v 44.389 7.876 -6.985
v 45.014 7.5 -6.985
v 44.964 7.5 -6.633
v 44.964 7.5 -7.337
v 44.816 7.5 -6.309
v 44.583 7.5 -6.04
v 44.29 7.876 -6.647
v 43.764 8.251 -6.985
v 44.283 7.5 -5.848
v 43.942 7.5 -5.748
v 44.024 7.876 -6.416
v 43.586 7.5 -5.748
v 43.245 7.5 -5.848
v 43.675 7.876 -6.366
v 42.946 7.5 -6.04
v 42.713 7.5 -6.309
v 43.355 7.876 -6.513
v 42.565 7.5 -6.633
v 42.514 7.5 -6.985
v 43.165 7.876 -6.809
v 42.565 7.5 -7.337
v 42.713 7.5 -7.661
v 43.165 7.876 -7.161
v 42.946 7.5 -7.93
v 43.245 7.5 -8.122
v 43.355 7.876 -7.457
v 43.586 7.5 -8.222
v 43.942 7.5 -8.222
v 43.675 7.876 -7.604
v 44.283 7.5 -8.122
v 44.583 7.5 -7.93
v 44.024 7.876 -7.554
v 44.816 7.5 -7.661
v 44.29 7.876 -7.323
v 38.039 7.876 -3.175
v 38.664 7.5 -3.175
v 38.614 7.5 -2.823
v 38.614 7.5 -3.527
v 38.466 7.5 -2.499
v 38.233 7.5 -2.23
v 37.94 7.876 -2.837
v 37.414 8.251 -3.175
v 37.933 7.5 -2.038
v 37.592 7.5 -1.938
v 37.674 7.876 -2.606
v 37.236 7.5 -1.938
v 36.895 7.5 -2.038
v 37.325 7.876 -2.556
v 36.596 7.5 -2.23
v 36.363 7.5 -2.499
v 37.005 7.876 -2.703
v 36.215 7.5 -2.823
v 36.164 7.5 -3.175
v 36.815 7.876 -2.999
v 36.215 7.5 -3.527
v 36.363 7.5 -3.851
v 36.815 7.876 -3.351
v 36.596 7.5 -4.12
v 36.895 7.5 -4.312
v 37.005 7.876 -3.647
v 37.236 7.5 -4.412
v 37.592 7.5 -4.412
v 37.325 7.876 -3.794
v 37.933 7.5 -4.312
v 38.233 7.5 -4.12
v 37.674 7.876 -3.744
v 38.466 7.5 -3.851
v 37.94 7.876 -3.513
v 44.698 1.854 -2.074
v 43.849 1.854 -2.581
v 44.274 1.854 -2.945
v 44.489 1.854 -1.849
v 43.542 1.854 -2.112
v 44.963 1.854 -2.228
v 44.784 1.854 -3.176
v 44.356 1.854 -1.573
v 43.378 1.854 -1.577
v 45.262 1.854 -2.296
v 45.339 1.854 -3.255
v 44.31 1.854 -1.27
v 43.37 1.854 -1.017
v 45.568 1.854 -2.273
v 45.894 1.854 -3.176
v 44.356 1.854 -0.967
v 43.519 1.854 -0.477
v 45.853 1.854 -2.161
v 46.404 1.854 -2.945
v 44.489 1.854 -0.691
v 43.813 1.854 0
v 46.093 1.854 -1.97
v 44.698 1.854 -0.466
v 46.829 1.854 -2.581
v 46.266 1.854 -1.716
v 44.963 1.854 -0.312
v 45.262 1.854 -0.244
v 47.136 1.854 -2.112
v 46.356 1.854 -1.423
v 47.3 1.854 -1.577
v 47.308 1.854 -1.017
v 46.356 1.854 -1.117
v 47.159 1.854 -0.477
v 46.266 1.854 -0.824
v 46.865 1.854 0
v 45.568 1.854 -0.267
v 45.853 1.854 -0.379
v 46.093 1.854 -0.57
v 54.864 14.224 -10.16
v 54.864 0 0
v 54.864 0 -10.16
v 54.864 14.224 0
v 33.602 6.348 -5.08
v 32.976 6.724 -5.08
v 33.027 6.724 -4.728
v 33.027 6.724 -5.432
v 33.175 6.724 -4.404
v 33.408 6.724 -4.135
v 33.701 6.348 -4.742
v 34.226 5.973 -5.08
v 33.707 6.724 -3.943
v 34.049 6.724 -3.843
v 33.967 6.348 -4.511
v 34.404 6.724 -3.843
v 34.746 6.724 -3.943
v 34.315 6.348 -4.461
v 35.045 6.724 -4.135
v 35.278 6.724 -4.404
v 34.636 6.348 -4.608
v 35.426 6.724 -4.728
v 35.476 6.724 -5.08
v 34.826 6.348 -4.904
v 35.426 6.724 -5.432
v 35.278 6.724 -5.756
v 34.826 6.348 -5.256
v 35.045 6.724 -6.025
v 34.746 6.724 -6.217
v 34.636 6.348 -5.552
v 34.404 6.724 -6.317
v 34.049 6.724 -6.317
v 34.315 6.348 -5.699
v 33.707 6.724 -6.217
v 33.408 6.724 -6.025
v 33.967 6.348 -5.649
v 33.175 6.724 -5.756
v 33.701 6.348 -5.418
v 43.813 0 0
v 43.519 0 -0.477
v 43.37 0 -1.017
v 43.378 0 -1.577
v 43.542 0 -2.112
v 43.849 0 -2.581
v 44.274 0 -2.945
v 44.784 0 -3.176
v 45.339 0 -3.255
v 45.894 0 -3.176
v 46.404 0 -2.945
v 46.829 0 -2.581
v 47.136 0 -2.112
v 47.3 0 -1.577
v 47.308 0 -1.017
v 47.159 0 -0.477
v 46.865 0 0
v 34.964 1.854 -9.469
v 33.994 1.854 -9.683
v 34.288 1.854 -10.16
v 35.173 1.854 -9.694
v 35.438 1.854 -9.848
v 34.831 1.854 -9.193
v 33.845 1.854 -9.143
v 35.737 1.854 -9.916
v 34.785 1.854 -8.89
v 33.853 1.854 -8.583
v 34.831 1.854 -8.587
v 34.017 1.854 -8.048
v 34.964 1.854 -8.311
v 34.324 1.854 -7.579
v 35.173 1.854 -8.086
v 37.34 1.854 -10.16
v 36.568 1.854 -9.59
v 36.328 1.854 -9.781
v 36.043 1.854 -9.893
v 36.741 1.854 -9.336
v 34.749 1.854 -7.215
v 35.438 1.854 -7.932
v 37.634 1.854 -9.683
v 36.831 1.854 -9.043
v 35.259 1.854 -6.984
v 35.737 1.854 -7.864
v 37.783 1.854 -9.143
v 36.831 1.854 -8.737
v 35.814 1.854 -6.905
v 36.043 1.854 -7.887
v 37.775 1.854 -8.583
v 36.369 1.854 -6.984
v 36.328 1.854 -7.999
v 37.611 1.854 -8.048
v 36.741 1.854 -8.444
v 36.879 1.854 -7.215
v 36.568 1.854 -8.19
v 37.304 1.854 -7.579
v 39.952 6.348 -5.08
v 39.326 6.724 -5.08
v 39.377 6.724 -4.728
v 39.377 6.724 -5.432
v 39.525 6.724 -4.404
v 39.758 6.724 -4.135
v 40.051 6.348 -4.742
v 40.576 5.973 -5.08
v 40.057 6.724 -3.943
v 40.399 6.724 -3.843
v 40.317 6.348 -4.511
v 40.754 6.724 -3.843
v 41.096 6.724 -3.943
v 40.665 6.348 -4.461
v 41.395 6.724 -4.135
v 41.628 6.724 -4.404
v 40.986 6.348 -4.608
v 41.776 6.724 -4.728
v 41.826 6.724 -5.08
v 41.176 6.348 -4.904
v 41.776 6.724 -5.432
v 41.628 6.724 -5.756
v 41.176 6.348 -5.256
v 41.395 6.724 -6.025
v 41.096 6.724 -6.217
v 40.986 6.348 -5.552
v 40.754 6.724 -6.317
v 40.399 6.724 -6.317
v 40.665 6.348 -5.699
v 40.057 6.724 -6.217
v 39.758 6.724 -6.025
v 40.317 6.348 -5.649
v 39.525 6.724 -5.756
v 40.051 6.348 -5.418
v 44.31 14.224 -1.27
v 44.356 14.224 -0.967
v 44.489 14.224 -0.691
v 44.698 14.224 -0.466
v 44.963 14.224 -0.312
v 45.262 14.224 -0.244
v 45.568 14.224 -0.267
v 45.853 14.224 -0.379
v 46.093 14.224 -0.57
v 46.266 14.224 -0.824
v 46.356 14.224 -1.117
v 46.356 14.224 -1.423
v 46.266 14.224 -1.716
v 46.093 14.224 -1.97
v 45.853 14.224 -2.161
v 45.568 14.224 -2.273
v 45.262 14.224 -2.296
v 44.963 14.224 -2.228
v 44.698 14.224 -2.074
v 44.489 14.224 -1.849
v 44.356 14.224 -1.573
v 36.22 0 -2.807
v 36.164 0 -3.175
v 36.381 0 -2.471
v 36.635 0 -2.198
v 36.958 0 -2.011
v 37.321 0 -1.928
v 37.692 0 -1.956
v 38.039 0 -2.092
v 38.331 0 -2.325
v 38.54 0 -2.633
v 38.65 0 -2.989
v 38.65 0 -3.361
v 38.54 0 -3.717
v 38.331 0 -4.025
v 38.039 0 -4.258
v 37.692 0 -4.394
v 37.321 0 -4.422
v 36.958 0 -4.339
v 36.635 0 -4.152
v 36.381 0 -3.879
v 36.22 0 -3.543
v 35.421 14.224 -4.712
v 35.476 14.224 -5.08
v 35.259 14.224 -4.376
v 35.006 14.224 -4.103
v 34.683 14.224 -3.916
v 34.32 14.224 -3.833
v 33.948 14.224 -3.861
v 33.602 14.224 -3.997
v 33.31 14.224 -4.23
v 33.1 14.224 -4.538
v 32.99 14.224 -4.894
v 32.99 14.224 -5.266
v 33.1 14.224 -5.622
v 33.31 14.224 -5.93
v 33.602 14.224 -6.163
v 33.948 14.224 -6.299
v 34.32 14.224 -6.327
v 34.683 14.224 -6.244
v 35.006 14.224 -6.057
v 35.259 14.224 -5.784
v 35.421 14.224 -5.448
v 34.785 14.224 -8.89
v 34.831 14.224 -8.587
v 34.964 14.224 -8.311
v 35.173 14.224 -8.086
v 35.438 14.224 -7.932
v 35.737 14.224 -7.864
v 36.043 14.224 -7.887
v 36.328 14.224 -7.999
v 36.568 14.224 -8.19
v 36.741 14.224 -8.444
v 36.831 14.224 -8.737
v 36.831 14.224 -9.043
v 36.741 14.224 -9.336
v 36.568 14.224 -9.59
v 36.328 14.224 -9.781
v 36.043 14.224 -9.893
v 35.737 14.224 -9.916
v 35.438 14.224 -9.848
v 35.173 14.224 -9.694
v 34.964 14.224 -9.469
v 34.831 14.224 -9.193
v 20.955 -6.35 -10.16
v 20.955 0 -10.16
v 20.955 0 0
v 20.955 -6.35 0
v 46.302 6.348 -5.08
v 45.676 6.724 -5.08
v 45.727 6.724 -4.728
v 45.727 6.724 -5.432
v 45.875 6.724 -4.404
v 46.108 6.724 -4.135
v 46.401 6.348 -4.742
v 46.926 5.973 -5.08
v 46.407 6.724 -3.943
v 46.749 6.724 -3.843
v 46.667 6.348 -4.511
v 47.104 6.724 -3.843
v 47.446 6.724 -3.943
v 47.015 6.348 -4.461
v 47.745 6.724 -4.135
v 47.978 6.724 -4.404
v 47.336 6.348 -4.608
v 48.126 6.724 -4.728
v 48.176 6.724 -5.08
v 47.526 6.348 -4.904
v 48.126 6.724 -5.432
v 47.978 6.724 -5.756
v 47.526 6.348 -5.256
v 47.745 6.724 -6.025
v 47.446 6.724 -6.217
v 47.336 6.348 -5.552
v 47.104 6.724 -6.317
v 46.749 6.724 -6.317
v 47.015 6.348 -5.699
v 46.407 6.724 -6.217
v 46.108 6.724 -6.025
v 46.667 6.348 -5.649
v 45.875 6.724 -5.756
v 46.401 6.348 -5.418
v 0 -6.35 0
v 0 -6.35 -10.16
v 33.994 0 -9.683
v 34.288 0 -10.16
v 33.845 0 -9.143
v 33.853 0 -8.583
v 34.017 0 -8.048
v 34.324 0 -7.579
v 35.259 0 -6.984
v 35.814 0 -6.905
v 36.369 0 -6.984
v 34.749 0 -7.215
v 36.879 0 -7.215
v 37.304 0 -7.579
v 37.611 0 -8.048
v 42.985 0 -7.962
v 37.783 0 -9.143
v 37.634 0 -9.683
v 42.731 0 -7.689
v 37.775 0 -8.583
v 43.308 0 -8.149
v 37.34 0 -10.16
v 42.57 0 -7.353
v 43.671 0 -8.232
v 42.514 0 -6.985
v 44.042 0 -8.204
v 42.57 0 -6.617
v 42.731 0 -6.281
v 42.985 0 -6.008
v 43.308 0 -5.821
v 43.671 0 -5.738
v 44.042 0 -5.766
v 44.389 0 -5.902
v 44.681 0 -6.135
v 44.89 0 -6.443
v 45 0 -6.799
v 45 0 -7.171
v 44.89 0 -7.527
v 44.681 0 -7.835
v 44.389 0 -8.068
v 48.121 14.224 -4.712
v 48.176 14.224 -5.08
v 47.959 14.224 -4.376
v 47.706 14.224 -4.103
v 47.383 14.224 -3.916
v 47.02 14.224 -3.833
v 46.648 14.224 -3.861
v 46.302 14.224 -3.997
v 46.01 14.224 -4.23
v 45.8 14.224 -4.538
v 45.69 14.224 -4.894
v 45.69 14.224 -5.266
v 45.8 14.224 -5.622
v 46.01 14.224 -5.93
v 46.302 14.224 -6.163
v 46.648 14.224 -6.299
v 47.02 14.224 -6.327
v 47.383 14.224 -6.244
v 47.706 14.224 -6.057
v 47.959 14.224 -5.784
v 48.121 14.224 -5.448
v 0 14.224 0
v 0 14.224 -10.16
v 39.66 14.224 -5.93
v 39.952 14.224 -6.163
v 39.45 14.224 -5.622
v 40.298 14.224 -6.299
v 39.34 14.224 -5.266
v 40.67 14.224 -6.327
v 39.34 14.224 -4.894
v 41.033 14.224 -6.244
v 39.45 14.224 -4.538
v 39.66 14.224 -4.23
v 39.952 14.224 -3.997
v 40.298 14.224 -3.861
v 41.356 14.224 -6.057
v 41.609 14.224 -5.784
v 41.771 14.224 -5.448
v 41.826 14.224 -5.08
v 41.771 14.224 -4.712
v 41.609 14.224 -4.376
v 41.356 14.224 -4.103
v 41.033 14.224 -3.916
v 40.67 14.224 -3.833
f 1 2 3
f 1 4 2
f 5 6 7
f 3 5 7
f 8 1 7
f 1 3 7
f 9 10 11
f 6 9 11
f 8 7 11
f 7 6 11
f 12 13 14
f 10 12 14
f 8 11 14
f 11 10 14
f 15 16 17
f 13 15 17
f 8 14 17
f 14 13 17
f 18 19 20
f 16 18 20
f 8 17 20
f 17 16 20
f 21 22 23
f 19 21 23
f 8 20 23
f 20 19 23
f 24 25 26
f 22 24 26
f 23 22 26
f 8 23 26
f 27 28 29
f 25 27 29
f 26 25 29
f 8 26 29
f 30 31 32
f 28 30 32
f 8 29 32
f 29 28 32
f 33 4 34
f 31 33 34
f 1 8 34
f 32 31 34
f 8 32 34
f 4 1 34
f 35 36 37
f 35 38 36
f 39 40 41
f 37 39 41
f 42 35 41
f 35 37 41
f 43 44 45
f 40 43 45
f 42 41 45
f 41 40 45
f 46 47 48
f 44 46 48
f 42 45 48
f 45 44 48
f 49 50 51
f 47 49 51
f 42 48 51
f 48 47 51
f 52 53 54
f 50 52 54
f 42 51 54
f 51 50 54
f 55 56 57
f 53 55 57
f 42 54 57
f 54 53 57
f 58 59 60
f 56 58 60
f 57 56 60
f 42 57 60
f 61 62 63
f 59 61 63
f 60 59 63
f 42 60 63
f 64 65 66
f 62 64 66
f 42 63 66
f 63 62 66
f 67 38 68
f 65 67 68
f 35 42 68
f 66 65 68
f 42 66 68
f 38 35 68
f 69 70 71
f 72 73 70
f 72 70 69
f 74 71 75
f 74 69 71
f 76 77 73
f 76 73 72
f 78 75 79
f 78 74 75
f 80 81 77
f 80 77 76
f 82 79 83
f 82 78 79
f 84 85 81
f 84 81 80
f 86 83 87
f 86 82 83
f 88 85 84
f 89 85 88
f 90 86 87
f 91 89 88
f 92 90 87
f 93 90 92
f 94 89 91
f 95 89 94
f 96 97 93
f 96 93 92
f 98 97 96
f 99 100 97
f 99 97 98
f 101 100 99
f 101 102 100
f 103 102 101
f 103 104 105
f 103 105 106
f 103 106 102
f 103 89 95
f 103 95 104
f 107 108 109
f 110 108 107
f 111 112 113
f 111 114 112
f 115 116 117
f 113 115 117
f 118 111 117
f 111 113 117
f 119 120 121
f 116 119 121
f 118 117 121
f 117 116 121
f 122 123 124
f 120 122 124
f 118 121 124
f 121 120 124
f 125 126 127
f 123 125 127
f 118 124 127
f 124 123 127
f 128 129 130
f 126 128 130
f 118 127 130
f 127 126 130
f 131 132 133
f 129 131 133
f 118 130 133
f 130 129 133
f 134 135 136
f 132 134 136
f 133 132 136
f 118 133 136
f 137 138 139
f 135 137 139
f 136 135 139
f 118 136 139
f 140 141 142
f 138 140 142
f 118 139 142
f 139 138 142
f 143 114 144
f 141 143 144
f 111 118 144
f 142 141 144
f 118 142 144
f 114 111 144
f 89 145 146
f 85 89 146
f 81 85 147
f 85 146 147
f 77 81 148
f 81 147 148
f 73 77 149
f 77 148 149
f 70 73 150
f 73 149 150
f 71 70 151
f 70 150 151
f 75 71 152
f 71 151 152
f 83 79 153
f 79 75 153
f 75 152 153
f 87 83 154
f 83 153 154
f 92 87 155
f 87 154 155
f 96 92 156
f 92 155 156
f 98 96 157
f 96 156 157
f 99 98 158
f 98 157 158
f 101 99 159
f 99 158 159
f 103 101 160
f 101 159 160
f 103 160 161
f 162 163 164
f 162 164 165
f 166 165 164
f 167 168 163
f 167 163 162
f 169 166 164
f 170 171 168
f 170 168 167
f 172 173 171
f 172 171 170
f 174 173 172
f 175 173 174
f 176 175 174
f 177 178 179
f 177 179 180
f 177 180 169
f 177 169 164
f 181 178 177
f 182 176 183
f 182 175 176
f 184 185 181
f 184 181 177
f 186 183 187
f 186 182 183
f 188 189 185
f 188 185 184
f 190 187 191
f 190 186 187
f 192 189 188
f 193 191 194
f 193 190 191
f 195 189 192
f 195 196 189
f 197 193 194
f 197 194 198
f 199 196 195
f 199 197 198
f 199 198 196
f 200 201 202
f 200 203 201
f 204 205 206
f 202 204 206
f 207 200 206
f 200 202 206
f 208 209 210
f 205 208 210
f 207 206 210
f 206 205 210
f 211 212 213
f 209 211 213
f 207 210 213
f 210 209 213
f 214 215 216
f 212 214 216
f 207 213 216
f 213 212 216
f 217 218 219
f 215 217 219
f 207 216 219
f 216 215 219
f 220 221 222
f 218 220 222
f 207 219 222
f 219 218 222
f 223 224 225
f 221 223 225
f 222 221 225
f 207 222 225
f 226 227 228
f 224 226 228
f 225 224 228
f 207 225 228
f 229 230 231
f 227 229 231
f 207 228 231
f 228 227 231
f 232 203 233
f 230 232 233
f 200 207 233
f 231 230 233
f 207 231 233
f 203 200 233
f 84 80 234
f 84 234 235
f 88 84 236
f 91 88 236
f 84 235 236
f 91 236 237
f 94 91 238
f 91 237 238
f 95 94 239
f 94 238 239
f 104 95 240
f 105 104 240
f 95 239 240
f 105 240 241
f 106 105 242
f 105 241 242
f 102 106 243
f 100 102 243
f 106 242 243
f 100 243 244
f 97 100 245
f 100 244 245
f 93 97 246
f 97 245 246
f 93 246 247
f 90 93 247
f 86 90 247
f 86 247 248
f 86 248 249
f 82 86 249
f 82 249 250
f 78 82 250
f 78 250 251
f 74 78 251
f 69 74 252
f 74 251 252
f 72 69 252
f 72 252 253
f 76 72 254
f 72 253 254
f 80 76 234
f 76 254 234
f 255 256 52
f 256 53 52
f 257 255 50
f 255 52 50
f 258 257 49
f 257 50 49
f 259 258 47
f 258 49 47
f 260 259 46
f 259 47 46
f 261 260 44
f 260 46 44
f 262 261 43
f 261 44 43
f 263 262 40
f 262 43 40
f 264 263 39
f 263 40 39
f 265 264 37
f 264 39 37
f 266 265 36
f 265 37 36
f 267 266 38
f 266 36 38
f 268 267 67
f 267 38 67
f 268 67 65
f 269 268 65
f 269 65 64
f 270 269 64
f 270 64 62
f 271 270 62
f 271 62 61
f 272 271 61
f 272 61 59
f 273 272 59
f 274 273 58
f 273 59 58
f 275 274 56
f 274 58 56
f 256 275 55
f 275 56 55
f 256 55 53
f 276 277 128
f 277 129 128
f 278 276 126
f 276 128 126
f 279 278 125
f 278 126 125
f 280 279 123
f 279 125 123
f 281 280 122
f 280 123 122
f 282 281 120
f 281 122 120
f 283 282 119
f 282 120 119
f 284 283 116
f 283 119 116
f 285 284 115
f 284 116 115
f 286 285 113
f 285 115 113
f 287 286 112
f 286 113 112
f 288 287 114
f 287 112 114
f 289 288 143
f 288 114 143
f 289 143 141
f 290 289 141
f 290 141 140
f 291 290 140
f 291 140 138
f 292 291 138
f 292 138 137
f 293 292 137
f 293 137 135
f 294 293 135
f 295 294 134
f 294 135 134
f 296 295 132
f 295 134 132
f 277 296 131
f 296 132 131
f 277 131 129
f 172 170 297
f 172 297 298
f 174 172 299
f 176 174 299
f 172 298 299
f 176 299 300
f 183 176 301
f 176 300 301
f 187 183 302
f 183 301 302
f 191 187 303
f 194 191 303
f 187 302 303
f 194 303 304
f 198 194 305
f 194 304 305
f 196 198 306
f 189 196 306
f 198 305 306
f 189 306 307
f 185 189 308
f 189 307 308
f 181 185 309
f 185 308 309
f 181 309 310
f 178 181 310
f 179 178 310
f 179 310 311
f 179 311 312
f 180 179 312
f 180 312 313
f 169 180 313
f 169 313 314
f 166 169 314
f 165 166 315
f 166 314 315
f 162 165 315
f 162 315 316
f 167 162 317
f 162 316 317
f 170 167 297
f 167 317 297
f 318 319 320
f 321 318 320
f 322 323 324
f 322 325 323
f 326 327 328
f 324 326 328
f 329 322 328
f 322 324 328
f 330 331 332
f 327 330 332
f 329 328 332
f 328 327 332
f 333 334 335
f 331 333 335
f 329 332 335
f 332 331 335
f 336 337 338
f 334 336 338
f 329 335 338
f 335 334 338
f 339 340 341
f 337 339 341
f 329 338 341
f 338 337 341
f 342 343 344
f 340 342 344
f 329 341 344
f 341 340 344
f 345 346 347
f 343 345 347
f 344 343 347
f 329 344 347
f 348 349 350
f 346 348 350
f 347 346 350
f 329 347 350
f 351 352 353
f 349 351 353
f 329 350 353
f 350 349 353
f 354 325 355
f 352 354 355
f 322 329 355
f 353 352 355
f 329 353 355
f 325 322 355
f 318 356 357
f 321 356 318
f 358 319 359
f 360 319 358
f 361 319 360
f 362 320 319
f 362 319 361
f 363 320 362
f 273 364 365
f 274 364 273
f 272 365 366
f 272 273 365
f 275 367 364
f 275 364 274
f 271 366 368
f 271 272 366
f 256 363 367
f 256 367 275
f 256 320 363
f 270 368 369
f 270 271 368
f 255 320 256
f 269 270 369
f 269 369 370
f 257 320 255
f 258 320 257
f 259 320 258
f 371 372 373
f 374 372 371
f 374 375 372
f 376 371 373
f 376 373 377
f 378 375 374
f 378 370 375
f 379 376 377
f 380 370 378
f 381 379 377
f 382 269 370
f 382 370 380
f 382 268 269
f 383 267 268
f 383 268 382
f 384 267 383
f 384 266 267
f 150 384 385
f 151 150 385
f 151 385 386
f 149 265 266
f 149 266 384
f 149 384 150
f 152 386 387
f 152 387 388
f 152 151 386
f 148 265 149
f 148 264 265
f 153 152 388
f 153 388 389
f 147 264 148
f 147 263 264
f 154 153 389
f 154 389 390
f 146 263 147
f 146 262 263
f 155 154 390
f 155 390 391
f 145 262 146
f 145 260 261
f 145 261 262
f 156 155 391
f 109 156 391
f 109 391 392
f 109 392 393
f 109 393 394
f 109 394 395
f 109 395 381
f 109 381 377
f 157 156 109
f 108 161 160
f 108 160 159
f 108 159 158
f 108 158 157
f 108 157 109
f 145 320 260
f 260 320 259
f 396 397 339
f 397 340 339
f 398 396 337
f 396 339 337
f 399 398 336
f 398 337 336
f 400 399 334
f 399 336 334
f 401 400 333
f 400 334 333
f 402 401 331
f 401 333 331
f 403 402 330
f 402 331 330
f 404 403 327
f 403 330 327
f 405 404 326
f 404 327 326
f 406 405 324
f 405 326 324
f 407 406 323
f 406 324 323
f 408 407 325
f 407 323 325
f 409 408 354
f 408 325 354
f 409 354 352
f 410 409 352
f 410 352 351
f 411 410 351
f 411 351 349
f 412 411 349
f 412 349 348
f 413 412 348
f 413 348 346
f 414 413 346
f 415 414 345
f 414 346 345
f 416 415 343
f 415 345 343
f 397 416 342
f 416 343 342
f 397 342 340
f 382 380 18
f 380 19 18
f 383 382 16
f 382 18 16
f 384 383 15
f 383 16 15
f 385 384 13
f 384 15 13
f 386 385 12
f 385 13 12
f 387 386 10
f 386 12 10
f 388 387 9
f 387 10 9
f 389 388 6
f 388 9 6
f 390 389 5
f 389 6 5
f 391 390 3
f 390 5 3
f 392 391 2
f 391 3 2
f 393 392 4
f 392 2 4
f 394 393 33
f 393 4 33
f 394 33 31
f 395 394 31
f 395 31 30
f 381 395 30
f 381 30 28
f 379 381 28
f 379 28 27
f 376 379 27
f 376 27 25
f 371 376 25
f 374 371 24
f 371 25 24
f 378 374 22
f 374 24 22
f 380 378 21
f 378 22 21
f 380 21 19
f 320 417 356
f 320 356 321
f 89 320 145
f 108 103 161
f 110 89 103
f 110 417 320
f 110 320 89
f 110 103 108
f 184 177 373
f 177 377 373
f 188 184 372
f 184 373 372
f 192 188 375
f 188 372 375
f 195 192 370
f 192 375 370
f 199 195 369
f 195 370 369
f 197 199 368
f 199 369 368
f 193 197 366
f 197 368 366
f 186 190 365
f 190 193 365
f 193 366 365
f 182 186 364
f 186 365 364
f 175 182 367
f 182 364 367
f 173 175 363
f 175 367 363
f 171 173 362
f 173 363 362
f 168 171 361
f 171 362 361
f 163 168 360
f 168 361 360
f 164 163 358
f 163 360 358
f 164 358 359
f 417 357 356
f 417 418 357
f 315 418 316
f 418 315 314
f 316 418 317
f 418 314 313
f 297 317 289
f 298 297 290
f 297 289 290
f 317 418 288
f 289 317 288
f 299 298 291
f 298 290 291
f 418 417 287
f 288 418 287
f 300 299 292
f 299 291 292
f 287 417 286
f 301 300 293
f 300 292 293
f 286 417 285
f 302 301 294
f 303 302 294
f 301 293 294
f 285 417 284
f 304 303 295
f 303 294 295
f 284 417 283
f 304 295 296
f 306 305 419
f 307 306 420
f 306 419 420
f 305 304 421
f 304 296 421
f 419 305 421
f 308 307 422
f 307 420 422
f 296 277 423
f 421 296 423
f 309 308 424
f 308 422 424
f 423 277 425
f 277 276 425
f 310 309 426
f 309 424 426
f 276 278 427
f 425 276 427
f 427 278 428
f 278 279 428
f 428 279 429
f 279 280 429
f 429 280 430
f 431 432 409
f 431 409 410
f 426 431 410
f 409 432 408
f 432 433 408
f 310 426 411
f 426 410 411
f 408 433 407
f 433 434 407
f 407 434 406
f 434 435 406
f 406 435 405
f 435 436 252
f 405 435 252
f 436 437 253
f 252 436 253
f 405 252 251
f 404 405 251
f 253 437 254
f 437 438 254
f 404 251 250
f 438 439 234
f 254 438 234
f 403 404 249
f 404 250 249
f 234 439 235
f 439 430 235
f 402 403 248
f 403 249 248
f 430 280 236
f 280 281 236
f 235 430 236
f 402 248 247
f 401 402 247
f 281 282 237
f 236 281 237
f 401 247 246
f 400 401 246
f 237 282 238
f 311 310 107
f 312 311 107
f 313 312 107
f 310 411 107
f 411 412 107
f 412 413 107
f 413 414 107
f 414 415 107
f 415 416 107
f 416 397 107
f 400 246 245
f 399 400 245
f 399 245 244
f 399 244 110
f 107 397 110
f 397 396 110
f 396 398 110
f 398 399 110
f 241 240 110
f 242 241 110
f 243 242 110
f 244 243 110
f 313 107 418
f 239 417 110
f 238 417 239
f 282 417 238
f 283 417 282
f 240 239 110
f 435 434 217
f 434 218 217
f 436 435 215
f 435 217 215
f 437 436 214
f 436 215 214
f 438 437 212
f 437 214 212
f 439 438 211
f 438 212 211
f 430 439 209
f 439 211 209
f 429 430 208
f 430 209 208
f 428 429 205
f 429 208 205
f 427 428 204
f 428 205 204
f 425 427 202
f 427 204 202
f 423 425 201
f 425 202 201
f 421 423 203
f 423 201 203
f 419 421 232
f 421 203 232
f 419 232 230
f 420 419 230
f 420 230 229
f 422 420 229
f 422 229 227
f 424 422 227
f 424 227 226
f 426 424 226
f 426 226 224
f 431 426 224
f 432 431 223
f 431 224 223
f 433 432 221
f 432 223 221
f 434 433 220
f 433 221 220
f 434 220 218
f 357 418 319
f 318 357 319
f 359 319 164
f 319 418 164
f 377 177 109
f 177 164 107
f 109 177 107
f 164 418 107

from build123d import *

# Parameters (mm, degrees)
SKETCH1_W                                      = 54.864
SKETCH1_H                                      = 14.224
BASE_EXTRUDE_DEPTH                             = 10.16
SKETCH2_W                                      = 20.955
SKETCH2_H                                      = 10.16
BOSS_EXTRUDE1_DEPTH                            = 6.35
M3X0_5_TAPPED_HOLE1_D                          = 2.5
M3X0_5_TAPPED_HOLE1_DEPTH                      = 7.499985
M3X0_5_TAPPED_HOLE1_TIP                        = 0.751075774
CBORE_FOR_1_SOCKET_HEAD_CAP_SCREW1_D           = 2.0574
CBORE_FOR_1_SOCKET_HEAD_CAP_SCREW1_DEPTH       = 22.86
CBORE_FOR_1_SOCKET_HEAD_CAP_SCREW1_CBORE_D     = 3.97002
CBORE_FOR_1_SOCKET_HEAD_CAP_SCREW1_CBORE_DEPTH = 1.8542
CBORE_FOR_1_SOCKET_HEAD_CAP_SCREW1_TIP         = 0.618105319
M3X0_5_TAPPED_HOLE2_D                          = 2.5
M3X0_5_TAPPED_HOLE2_DEPTH                      = 7.5000104
M3X0_5_TAPPED_HOLE2_TIP                        = 0.751075774


with BuildPart() as part:
    # Sketch1 → Base-Extrude (new body)
    with BuildSketch(Plane.XY):
        with Locations((27.432, 7.112)):
            Rectangle(SKETCH1_W, SKETCH1_H)
    extrude(amount=-BASE_EXTRUDE_DEPTH)

    # Sketch2 → Boss-Extrude1 (add)
    with BuildSketch(Plane.XZ):
        with Locations((10.4775, -5.08)):
            Rectangle(SKETCH2_W, SKETCH2_H)
    extrude(amount=BOSS_EXTRUDE1_DEPTH)

    # M3x0.5 Tapped Hole1
    with Locations(Plane(origin=(0, 14.224, 0), x_dir=(-1, 0, 0), z_dir=(0, 1, 0))):
        with Locations((-46.9265, -5.08), (-40.5765, -5.08), (-34.2265, -5.08)):
            Hole(M3X0_5_TAPPED_HOLE1_D / 2, depth=M3X0_5_TAPPED_HOLE1_DEPTH)
            with Locations((0, 0, -(M3X0_5_TAPPED_HOLE1_DEPTH + M3X0_5_TAPPED_HOLE1_TIP / 2))):  # 118° drill point
                Cone(0, M3X0_5_TAPPED_HOLE1_D / 2, M3X0_5_TAPPED_HOLE1_TIP, mode=Mode.SUBTRACT)

    # CBORE for #1 Socket Head Cap Screw1
    with Locations(Plane.XZ):
        with Locations((45.339, -1.27), (35.814, -8.89)):
            CounterBoreHole(CBORE_FOR_1_SOCKET_HEAD_CAP_SCREW1_D / 2, CBORE_FOR_1_SOCKET_HEAD_CAP_SCREW1_CBORE_D / 2, CBORE_FOR_1_SOCKET_HEAD_CAP_SCREW1_CBORE_DEPTH, depth=CBORE_FOR_1_SOCKET_HEAD_CAP_SCREW1_DEPTH)
            with Locations((0, 0, -(CBORE_FOR_1_SOCKET_HEAD_CAP_SCREW1_DEPTH + CBORE_FOR_1_SOCKET_HEAD_CAP_SCREW1_TIP / 2))):  # 118° drill point
                Cone(0, CBORE_FOR_1_SOCKET_HEAD_CAP_SCREW1_D / 2, CBORE_FOR_1_SOCKET_HEAD_CAP_SCREW1_TIP, mode=Mode.SUBTRACT)

    # M3x0.5 Tapped Hole2
    with Locations(Plane.XZ):
        with Locations((43.7642, -6.985), (37.4142, -3.175)):
            Hole(M3X0_5_TAPPED_HOLE2_D / 2, depth=M3X0_5_TAPPED_HOLE2_DEPTH)
            with Locations((0, 0, -(M3X0_5_TAPPED_HOLE2_DEPTH + M3X0_5_TAPPED_HOLE2_TIP / 2))):  # 118° drill point
                Cone(0, M3X0_5_TAPPED_HOLE2_D / 2, M3X0_5_TAPPED_HOLE2_TIP, mode=Mode.SUBTRACT)


solid = part.part
